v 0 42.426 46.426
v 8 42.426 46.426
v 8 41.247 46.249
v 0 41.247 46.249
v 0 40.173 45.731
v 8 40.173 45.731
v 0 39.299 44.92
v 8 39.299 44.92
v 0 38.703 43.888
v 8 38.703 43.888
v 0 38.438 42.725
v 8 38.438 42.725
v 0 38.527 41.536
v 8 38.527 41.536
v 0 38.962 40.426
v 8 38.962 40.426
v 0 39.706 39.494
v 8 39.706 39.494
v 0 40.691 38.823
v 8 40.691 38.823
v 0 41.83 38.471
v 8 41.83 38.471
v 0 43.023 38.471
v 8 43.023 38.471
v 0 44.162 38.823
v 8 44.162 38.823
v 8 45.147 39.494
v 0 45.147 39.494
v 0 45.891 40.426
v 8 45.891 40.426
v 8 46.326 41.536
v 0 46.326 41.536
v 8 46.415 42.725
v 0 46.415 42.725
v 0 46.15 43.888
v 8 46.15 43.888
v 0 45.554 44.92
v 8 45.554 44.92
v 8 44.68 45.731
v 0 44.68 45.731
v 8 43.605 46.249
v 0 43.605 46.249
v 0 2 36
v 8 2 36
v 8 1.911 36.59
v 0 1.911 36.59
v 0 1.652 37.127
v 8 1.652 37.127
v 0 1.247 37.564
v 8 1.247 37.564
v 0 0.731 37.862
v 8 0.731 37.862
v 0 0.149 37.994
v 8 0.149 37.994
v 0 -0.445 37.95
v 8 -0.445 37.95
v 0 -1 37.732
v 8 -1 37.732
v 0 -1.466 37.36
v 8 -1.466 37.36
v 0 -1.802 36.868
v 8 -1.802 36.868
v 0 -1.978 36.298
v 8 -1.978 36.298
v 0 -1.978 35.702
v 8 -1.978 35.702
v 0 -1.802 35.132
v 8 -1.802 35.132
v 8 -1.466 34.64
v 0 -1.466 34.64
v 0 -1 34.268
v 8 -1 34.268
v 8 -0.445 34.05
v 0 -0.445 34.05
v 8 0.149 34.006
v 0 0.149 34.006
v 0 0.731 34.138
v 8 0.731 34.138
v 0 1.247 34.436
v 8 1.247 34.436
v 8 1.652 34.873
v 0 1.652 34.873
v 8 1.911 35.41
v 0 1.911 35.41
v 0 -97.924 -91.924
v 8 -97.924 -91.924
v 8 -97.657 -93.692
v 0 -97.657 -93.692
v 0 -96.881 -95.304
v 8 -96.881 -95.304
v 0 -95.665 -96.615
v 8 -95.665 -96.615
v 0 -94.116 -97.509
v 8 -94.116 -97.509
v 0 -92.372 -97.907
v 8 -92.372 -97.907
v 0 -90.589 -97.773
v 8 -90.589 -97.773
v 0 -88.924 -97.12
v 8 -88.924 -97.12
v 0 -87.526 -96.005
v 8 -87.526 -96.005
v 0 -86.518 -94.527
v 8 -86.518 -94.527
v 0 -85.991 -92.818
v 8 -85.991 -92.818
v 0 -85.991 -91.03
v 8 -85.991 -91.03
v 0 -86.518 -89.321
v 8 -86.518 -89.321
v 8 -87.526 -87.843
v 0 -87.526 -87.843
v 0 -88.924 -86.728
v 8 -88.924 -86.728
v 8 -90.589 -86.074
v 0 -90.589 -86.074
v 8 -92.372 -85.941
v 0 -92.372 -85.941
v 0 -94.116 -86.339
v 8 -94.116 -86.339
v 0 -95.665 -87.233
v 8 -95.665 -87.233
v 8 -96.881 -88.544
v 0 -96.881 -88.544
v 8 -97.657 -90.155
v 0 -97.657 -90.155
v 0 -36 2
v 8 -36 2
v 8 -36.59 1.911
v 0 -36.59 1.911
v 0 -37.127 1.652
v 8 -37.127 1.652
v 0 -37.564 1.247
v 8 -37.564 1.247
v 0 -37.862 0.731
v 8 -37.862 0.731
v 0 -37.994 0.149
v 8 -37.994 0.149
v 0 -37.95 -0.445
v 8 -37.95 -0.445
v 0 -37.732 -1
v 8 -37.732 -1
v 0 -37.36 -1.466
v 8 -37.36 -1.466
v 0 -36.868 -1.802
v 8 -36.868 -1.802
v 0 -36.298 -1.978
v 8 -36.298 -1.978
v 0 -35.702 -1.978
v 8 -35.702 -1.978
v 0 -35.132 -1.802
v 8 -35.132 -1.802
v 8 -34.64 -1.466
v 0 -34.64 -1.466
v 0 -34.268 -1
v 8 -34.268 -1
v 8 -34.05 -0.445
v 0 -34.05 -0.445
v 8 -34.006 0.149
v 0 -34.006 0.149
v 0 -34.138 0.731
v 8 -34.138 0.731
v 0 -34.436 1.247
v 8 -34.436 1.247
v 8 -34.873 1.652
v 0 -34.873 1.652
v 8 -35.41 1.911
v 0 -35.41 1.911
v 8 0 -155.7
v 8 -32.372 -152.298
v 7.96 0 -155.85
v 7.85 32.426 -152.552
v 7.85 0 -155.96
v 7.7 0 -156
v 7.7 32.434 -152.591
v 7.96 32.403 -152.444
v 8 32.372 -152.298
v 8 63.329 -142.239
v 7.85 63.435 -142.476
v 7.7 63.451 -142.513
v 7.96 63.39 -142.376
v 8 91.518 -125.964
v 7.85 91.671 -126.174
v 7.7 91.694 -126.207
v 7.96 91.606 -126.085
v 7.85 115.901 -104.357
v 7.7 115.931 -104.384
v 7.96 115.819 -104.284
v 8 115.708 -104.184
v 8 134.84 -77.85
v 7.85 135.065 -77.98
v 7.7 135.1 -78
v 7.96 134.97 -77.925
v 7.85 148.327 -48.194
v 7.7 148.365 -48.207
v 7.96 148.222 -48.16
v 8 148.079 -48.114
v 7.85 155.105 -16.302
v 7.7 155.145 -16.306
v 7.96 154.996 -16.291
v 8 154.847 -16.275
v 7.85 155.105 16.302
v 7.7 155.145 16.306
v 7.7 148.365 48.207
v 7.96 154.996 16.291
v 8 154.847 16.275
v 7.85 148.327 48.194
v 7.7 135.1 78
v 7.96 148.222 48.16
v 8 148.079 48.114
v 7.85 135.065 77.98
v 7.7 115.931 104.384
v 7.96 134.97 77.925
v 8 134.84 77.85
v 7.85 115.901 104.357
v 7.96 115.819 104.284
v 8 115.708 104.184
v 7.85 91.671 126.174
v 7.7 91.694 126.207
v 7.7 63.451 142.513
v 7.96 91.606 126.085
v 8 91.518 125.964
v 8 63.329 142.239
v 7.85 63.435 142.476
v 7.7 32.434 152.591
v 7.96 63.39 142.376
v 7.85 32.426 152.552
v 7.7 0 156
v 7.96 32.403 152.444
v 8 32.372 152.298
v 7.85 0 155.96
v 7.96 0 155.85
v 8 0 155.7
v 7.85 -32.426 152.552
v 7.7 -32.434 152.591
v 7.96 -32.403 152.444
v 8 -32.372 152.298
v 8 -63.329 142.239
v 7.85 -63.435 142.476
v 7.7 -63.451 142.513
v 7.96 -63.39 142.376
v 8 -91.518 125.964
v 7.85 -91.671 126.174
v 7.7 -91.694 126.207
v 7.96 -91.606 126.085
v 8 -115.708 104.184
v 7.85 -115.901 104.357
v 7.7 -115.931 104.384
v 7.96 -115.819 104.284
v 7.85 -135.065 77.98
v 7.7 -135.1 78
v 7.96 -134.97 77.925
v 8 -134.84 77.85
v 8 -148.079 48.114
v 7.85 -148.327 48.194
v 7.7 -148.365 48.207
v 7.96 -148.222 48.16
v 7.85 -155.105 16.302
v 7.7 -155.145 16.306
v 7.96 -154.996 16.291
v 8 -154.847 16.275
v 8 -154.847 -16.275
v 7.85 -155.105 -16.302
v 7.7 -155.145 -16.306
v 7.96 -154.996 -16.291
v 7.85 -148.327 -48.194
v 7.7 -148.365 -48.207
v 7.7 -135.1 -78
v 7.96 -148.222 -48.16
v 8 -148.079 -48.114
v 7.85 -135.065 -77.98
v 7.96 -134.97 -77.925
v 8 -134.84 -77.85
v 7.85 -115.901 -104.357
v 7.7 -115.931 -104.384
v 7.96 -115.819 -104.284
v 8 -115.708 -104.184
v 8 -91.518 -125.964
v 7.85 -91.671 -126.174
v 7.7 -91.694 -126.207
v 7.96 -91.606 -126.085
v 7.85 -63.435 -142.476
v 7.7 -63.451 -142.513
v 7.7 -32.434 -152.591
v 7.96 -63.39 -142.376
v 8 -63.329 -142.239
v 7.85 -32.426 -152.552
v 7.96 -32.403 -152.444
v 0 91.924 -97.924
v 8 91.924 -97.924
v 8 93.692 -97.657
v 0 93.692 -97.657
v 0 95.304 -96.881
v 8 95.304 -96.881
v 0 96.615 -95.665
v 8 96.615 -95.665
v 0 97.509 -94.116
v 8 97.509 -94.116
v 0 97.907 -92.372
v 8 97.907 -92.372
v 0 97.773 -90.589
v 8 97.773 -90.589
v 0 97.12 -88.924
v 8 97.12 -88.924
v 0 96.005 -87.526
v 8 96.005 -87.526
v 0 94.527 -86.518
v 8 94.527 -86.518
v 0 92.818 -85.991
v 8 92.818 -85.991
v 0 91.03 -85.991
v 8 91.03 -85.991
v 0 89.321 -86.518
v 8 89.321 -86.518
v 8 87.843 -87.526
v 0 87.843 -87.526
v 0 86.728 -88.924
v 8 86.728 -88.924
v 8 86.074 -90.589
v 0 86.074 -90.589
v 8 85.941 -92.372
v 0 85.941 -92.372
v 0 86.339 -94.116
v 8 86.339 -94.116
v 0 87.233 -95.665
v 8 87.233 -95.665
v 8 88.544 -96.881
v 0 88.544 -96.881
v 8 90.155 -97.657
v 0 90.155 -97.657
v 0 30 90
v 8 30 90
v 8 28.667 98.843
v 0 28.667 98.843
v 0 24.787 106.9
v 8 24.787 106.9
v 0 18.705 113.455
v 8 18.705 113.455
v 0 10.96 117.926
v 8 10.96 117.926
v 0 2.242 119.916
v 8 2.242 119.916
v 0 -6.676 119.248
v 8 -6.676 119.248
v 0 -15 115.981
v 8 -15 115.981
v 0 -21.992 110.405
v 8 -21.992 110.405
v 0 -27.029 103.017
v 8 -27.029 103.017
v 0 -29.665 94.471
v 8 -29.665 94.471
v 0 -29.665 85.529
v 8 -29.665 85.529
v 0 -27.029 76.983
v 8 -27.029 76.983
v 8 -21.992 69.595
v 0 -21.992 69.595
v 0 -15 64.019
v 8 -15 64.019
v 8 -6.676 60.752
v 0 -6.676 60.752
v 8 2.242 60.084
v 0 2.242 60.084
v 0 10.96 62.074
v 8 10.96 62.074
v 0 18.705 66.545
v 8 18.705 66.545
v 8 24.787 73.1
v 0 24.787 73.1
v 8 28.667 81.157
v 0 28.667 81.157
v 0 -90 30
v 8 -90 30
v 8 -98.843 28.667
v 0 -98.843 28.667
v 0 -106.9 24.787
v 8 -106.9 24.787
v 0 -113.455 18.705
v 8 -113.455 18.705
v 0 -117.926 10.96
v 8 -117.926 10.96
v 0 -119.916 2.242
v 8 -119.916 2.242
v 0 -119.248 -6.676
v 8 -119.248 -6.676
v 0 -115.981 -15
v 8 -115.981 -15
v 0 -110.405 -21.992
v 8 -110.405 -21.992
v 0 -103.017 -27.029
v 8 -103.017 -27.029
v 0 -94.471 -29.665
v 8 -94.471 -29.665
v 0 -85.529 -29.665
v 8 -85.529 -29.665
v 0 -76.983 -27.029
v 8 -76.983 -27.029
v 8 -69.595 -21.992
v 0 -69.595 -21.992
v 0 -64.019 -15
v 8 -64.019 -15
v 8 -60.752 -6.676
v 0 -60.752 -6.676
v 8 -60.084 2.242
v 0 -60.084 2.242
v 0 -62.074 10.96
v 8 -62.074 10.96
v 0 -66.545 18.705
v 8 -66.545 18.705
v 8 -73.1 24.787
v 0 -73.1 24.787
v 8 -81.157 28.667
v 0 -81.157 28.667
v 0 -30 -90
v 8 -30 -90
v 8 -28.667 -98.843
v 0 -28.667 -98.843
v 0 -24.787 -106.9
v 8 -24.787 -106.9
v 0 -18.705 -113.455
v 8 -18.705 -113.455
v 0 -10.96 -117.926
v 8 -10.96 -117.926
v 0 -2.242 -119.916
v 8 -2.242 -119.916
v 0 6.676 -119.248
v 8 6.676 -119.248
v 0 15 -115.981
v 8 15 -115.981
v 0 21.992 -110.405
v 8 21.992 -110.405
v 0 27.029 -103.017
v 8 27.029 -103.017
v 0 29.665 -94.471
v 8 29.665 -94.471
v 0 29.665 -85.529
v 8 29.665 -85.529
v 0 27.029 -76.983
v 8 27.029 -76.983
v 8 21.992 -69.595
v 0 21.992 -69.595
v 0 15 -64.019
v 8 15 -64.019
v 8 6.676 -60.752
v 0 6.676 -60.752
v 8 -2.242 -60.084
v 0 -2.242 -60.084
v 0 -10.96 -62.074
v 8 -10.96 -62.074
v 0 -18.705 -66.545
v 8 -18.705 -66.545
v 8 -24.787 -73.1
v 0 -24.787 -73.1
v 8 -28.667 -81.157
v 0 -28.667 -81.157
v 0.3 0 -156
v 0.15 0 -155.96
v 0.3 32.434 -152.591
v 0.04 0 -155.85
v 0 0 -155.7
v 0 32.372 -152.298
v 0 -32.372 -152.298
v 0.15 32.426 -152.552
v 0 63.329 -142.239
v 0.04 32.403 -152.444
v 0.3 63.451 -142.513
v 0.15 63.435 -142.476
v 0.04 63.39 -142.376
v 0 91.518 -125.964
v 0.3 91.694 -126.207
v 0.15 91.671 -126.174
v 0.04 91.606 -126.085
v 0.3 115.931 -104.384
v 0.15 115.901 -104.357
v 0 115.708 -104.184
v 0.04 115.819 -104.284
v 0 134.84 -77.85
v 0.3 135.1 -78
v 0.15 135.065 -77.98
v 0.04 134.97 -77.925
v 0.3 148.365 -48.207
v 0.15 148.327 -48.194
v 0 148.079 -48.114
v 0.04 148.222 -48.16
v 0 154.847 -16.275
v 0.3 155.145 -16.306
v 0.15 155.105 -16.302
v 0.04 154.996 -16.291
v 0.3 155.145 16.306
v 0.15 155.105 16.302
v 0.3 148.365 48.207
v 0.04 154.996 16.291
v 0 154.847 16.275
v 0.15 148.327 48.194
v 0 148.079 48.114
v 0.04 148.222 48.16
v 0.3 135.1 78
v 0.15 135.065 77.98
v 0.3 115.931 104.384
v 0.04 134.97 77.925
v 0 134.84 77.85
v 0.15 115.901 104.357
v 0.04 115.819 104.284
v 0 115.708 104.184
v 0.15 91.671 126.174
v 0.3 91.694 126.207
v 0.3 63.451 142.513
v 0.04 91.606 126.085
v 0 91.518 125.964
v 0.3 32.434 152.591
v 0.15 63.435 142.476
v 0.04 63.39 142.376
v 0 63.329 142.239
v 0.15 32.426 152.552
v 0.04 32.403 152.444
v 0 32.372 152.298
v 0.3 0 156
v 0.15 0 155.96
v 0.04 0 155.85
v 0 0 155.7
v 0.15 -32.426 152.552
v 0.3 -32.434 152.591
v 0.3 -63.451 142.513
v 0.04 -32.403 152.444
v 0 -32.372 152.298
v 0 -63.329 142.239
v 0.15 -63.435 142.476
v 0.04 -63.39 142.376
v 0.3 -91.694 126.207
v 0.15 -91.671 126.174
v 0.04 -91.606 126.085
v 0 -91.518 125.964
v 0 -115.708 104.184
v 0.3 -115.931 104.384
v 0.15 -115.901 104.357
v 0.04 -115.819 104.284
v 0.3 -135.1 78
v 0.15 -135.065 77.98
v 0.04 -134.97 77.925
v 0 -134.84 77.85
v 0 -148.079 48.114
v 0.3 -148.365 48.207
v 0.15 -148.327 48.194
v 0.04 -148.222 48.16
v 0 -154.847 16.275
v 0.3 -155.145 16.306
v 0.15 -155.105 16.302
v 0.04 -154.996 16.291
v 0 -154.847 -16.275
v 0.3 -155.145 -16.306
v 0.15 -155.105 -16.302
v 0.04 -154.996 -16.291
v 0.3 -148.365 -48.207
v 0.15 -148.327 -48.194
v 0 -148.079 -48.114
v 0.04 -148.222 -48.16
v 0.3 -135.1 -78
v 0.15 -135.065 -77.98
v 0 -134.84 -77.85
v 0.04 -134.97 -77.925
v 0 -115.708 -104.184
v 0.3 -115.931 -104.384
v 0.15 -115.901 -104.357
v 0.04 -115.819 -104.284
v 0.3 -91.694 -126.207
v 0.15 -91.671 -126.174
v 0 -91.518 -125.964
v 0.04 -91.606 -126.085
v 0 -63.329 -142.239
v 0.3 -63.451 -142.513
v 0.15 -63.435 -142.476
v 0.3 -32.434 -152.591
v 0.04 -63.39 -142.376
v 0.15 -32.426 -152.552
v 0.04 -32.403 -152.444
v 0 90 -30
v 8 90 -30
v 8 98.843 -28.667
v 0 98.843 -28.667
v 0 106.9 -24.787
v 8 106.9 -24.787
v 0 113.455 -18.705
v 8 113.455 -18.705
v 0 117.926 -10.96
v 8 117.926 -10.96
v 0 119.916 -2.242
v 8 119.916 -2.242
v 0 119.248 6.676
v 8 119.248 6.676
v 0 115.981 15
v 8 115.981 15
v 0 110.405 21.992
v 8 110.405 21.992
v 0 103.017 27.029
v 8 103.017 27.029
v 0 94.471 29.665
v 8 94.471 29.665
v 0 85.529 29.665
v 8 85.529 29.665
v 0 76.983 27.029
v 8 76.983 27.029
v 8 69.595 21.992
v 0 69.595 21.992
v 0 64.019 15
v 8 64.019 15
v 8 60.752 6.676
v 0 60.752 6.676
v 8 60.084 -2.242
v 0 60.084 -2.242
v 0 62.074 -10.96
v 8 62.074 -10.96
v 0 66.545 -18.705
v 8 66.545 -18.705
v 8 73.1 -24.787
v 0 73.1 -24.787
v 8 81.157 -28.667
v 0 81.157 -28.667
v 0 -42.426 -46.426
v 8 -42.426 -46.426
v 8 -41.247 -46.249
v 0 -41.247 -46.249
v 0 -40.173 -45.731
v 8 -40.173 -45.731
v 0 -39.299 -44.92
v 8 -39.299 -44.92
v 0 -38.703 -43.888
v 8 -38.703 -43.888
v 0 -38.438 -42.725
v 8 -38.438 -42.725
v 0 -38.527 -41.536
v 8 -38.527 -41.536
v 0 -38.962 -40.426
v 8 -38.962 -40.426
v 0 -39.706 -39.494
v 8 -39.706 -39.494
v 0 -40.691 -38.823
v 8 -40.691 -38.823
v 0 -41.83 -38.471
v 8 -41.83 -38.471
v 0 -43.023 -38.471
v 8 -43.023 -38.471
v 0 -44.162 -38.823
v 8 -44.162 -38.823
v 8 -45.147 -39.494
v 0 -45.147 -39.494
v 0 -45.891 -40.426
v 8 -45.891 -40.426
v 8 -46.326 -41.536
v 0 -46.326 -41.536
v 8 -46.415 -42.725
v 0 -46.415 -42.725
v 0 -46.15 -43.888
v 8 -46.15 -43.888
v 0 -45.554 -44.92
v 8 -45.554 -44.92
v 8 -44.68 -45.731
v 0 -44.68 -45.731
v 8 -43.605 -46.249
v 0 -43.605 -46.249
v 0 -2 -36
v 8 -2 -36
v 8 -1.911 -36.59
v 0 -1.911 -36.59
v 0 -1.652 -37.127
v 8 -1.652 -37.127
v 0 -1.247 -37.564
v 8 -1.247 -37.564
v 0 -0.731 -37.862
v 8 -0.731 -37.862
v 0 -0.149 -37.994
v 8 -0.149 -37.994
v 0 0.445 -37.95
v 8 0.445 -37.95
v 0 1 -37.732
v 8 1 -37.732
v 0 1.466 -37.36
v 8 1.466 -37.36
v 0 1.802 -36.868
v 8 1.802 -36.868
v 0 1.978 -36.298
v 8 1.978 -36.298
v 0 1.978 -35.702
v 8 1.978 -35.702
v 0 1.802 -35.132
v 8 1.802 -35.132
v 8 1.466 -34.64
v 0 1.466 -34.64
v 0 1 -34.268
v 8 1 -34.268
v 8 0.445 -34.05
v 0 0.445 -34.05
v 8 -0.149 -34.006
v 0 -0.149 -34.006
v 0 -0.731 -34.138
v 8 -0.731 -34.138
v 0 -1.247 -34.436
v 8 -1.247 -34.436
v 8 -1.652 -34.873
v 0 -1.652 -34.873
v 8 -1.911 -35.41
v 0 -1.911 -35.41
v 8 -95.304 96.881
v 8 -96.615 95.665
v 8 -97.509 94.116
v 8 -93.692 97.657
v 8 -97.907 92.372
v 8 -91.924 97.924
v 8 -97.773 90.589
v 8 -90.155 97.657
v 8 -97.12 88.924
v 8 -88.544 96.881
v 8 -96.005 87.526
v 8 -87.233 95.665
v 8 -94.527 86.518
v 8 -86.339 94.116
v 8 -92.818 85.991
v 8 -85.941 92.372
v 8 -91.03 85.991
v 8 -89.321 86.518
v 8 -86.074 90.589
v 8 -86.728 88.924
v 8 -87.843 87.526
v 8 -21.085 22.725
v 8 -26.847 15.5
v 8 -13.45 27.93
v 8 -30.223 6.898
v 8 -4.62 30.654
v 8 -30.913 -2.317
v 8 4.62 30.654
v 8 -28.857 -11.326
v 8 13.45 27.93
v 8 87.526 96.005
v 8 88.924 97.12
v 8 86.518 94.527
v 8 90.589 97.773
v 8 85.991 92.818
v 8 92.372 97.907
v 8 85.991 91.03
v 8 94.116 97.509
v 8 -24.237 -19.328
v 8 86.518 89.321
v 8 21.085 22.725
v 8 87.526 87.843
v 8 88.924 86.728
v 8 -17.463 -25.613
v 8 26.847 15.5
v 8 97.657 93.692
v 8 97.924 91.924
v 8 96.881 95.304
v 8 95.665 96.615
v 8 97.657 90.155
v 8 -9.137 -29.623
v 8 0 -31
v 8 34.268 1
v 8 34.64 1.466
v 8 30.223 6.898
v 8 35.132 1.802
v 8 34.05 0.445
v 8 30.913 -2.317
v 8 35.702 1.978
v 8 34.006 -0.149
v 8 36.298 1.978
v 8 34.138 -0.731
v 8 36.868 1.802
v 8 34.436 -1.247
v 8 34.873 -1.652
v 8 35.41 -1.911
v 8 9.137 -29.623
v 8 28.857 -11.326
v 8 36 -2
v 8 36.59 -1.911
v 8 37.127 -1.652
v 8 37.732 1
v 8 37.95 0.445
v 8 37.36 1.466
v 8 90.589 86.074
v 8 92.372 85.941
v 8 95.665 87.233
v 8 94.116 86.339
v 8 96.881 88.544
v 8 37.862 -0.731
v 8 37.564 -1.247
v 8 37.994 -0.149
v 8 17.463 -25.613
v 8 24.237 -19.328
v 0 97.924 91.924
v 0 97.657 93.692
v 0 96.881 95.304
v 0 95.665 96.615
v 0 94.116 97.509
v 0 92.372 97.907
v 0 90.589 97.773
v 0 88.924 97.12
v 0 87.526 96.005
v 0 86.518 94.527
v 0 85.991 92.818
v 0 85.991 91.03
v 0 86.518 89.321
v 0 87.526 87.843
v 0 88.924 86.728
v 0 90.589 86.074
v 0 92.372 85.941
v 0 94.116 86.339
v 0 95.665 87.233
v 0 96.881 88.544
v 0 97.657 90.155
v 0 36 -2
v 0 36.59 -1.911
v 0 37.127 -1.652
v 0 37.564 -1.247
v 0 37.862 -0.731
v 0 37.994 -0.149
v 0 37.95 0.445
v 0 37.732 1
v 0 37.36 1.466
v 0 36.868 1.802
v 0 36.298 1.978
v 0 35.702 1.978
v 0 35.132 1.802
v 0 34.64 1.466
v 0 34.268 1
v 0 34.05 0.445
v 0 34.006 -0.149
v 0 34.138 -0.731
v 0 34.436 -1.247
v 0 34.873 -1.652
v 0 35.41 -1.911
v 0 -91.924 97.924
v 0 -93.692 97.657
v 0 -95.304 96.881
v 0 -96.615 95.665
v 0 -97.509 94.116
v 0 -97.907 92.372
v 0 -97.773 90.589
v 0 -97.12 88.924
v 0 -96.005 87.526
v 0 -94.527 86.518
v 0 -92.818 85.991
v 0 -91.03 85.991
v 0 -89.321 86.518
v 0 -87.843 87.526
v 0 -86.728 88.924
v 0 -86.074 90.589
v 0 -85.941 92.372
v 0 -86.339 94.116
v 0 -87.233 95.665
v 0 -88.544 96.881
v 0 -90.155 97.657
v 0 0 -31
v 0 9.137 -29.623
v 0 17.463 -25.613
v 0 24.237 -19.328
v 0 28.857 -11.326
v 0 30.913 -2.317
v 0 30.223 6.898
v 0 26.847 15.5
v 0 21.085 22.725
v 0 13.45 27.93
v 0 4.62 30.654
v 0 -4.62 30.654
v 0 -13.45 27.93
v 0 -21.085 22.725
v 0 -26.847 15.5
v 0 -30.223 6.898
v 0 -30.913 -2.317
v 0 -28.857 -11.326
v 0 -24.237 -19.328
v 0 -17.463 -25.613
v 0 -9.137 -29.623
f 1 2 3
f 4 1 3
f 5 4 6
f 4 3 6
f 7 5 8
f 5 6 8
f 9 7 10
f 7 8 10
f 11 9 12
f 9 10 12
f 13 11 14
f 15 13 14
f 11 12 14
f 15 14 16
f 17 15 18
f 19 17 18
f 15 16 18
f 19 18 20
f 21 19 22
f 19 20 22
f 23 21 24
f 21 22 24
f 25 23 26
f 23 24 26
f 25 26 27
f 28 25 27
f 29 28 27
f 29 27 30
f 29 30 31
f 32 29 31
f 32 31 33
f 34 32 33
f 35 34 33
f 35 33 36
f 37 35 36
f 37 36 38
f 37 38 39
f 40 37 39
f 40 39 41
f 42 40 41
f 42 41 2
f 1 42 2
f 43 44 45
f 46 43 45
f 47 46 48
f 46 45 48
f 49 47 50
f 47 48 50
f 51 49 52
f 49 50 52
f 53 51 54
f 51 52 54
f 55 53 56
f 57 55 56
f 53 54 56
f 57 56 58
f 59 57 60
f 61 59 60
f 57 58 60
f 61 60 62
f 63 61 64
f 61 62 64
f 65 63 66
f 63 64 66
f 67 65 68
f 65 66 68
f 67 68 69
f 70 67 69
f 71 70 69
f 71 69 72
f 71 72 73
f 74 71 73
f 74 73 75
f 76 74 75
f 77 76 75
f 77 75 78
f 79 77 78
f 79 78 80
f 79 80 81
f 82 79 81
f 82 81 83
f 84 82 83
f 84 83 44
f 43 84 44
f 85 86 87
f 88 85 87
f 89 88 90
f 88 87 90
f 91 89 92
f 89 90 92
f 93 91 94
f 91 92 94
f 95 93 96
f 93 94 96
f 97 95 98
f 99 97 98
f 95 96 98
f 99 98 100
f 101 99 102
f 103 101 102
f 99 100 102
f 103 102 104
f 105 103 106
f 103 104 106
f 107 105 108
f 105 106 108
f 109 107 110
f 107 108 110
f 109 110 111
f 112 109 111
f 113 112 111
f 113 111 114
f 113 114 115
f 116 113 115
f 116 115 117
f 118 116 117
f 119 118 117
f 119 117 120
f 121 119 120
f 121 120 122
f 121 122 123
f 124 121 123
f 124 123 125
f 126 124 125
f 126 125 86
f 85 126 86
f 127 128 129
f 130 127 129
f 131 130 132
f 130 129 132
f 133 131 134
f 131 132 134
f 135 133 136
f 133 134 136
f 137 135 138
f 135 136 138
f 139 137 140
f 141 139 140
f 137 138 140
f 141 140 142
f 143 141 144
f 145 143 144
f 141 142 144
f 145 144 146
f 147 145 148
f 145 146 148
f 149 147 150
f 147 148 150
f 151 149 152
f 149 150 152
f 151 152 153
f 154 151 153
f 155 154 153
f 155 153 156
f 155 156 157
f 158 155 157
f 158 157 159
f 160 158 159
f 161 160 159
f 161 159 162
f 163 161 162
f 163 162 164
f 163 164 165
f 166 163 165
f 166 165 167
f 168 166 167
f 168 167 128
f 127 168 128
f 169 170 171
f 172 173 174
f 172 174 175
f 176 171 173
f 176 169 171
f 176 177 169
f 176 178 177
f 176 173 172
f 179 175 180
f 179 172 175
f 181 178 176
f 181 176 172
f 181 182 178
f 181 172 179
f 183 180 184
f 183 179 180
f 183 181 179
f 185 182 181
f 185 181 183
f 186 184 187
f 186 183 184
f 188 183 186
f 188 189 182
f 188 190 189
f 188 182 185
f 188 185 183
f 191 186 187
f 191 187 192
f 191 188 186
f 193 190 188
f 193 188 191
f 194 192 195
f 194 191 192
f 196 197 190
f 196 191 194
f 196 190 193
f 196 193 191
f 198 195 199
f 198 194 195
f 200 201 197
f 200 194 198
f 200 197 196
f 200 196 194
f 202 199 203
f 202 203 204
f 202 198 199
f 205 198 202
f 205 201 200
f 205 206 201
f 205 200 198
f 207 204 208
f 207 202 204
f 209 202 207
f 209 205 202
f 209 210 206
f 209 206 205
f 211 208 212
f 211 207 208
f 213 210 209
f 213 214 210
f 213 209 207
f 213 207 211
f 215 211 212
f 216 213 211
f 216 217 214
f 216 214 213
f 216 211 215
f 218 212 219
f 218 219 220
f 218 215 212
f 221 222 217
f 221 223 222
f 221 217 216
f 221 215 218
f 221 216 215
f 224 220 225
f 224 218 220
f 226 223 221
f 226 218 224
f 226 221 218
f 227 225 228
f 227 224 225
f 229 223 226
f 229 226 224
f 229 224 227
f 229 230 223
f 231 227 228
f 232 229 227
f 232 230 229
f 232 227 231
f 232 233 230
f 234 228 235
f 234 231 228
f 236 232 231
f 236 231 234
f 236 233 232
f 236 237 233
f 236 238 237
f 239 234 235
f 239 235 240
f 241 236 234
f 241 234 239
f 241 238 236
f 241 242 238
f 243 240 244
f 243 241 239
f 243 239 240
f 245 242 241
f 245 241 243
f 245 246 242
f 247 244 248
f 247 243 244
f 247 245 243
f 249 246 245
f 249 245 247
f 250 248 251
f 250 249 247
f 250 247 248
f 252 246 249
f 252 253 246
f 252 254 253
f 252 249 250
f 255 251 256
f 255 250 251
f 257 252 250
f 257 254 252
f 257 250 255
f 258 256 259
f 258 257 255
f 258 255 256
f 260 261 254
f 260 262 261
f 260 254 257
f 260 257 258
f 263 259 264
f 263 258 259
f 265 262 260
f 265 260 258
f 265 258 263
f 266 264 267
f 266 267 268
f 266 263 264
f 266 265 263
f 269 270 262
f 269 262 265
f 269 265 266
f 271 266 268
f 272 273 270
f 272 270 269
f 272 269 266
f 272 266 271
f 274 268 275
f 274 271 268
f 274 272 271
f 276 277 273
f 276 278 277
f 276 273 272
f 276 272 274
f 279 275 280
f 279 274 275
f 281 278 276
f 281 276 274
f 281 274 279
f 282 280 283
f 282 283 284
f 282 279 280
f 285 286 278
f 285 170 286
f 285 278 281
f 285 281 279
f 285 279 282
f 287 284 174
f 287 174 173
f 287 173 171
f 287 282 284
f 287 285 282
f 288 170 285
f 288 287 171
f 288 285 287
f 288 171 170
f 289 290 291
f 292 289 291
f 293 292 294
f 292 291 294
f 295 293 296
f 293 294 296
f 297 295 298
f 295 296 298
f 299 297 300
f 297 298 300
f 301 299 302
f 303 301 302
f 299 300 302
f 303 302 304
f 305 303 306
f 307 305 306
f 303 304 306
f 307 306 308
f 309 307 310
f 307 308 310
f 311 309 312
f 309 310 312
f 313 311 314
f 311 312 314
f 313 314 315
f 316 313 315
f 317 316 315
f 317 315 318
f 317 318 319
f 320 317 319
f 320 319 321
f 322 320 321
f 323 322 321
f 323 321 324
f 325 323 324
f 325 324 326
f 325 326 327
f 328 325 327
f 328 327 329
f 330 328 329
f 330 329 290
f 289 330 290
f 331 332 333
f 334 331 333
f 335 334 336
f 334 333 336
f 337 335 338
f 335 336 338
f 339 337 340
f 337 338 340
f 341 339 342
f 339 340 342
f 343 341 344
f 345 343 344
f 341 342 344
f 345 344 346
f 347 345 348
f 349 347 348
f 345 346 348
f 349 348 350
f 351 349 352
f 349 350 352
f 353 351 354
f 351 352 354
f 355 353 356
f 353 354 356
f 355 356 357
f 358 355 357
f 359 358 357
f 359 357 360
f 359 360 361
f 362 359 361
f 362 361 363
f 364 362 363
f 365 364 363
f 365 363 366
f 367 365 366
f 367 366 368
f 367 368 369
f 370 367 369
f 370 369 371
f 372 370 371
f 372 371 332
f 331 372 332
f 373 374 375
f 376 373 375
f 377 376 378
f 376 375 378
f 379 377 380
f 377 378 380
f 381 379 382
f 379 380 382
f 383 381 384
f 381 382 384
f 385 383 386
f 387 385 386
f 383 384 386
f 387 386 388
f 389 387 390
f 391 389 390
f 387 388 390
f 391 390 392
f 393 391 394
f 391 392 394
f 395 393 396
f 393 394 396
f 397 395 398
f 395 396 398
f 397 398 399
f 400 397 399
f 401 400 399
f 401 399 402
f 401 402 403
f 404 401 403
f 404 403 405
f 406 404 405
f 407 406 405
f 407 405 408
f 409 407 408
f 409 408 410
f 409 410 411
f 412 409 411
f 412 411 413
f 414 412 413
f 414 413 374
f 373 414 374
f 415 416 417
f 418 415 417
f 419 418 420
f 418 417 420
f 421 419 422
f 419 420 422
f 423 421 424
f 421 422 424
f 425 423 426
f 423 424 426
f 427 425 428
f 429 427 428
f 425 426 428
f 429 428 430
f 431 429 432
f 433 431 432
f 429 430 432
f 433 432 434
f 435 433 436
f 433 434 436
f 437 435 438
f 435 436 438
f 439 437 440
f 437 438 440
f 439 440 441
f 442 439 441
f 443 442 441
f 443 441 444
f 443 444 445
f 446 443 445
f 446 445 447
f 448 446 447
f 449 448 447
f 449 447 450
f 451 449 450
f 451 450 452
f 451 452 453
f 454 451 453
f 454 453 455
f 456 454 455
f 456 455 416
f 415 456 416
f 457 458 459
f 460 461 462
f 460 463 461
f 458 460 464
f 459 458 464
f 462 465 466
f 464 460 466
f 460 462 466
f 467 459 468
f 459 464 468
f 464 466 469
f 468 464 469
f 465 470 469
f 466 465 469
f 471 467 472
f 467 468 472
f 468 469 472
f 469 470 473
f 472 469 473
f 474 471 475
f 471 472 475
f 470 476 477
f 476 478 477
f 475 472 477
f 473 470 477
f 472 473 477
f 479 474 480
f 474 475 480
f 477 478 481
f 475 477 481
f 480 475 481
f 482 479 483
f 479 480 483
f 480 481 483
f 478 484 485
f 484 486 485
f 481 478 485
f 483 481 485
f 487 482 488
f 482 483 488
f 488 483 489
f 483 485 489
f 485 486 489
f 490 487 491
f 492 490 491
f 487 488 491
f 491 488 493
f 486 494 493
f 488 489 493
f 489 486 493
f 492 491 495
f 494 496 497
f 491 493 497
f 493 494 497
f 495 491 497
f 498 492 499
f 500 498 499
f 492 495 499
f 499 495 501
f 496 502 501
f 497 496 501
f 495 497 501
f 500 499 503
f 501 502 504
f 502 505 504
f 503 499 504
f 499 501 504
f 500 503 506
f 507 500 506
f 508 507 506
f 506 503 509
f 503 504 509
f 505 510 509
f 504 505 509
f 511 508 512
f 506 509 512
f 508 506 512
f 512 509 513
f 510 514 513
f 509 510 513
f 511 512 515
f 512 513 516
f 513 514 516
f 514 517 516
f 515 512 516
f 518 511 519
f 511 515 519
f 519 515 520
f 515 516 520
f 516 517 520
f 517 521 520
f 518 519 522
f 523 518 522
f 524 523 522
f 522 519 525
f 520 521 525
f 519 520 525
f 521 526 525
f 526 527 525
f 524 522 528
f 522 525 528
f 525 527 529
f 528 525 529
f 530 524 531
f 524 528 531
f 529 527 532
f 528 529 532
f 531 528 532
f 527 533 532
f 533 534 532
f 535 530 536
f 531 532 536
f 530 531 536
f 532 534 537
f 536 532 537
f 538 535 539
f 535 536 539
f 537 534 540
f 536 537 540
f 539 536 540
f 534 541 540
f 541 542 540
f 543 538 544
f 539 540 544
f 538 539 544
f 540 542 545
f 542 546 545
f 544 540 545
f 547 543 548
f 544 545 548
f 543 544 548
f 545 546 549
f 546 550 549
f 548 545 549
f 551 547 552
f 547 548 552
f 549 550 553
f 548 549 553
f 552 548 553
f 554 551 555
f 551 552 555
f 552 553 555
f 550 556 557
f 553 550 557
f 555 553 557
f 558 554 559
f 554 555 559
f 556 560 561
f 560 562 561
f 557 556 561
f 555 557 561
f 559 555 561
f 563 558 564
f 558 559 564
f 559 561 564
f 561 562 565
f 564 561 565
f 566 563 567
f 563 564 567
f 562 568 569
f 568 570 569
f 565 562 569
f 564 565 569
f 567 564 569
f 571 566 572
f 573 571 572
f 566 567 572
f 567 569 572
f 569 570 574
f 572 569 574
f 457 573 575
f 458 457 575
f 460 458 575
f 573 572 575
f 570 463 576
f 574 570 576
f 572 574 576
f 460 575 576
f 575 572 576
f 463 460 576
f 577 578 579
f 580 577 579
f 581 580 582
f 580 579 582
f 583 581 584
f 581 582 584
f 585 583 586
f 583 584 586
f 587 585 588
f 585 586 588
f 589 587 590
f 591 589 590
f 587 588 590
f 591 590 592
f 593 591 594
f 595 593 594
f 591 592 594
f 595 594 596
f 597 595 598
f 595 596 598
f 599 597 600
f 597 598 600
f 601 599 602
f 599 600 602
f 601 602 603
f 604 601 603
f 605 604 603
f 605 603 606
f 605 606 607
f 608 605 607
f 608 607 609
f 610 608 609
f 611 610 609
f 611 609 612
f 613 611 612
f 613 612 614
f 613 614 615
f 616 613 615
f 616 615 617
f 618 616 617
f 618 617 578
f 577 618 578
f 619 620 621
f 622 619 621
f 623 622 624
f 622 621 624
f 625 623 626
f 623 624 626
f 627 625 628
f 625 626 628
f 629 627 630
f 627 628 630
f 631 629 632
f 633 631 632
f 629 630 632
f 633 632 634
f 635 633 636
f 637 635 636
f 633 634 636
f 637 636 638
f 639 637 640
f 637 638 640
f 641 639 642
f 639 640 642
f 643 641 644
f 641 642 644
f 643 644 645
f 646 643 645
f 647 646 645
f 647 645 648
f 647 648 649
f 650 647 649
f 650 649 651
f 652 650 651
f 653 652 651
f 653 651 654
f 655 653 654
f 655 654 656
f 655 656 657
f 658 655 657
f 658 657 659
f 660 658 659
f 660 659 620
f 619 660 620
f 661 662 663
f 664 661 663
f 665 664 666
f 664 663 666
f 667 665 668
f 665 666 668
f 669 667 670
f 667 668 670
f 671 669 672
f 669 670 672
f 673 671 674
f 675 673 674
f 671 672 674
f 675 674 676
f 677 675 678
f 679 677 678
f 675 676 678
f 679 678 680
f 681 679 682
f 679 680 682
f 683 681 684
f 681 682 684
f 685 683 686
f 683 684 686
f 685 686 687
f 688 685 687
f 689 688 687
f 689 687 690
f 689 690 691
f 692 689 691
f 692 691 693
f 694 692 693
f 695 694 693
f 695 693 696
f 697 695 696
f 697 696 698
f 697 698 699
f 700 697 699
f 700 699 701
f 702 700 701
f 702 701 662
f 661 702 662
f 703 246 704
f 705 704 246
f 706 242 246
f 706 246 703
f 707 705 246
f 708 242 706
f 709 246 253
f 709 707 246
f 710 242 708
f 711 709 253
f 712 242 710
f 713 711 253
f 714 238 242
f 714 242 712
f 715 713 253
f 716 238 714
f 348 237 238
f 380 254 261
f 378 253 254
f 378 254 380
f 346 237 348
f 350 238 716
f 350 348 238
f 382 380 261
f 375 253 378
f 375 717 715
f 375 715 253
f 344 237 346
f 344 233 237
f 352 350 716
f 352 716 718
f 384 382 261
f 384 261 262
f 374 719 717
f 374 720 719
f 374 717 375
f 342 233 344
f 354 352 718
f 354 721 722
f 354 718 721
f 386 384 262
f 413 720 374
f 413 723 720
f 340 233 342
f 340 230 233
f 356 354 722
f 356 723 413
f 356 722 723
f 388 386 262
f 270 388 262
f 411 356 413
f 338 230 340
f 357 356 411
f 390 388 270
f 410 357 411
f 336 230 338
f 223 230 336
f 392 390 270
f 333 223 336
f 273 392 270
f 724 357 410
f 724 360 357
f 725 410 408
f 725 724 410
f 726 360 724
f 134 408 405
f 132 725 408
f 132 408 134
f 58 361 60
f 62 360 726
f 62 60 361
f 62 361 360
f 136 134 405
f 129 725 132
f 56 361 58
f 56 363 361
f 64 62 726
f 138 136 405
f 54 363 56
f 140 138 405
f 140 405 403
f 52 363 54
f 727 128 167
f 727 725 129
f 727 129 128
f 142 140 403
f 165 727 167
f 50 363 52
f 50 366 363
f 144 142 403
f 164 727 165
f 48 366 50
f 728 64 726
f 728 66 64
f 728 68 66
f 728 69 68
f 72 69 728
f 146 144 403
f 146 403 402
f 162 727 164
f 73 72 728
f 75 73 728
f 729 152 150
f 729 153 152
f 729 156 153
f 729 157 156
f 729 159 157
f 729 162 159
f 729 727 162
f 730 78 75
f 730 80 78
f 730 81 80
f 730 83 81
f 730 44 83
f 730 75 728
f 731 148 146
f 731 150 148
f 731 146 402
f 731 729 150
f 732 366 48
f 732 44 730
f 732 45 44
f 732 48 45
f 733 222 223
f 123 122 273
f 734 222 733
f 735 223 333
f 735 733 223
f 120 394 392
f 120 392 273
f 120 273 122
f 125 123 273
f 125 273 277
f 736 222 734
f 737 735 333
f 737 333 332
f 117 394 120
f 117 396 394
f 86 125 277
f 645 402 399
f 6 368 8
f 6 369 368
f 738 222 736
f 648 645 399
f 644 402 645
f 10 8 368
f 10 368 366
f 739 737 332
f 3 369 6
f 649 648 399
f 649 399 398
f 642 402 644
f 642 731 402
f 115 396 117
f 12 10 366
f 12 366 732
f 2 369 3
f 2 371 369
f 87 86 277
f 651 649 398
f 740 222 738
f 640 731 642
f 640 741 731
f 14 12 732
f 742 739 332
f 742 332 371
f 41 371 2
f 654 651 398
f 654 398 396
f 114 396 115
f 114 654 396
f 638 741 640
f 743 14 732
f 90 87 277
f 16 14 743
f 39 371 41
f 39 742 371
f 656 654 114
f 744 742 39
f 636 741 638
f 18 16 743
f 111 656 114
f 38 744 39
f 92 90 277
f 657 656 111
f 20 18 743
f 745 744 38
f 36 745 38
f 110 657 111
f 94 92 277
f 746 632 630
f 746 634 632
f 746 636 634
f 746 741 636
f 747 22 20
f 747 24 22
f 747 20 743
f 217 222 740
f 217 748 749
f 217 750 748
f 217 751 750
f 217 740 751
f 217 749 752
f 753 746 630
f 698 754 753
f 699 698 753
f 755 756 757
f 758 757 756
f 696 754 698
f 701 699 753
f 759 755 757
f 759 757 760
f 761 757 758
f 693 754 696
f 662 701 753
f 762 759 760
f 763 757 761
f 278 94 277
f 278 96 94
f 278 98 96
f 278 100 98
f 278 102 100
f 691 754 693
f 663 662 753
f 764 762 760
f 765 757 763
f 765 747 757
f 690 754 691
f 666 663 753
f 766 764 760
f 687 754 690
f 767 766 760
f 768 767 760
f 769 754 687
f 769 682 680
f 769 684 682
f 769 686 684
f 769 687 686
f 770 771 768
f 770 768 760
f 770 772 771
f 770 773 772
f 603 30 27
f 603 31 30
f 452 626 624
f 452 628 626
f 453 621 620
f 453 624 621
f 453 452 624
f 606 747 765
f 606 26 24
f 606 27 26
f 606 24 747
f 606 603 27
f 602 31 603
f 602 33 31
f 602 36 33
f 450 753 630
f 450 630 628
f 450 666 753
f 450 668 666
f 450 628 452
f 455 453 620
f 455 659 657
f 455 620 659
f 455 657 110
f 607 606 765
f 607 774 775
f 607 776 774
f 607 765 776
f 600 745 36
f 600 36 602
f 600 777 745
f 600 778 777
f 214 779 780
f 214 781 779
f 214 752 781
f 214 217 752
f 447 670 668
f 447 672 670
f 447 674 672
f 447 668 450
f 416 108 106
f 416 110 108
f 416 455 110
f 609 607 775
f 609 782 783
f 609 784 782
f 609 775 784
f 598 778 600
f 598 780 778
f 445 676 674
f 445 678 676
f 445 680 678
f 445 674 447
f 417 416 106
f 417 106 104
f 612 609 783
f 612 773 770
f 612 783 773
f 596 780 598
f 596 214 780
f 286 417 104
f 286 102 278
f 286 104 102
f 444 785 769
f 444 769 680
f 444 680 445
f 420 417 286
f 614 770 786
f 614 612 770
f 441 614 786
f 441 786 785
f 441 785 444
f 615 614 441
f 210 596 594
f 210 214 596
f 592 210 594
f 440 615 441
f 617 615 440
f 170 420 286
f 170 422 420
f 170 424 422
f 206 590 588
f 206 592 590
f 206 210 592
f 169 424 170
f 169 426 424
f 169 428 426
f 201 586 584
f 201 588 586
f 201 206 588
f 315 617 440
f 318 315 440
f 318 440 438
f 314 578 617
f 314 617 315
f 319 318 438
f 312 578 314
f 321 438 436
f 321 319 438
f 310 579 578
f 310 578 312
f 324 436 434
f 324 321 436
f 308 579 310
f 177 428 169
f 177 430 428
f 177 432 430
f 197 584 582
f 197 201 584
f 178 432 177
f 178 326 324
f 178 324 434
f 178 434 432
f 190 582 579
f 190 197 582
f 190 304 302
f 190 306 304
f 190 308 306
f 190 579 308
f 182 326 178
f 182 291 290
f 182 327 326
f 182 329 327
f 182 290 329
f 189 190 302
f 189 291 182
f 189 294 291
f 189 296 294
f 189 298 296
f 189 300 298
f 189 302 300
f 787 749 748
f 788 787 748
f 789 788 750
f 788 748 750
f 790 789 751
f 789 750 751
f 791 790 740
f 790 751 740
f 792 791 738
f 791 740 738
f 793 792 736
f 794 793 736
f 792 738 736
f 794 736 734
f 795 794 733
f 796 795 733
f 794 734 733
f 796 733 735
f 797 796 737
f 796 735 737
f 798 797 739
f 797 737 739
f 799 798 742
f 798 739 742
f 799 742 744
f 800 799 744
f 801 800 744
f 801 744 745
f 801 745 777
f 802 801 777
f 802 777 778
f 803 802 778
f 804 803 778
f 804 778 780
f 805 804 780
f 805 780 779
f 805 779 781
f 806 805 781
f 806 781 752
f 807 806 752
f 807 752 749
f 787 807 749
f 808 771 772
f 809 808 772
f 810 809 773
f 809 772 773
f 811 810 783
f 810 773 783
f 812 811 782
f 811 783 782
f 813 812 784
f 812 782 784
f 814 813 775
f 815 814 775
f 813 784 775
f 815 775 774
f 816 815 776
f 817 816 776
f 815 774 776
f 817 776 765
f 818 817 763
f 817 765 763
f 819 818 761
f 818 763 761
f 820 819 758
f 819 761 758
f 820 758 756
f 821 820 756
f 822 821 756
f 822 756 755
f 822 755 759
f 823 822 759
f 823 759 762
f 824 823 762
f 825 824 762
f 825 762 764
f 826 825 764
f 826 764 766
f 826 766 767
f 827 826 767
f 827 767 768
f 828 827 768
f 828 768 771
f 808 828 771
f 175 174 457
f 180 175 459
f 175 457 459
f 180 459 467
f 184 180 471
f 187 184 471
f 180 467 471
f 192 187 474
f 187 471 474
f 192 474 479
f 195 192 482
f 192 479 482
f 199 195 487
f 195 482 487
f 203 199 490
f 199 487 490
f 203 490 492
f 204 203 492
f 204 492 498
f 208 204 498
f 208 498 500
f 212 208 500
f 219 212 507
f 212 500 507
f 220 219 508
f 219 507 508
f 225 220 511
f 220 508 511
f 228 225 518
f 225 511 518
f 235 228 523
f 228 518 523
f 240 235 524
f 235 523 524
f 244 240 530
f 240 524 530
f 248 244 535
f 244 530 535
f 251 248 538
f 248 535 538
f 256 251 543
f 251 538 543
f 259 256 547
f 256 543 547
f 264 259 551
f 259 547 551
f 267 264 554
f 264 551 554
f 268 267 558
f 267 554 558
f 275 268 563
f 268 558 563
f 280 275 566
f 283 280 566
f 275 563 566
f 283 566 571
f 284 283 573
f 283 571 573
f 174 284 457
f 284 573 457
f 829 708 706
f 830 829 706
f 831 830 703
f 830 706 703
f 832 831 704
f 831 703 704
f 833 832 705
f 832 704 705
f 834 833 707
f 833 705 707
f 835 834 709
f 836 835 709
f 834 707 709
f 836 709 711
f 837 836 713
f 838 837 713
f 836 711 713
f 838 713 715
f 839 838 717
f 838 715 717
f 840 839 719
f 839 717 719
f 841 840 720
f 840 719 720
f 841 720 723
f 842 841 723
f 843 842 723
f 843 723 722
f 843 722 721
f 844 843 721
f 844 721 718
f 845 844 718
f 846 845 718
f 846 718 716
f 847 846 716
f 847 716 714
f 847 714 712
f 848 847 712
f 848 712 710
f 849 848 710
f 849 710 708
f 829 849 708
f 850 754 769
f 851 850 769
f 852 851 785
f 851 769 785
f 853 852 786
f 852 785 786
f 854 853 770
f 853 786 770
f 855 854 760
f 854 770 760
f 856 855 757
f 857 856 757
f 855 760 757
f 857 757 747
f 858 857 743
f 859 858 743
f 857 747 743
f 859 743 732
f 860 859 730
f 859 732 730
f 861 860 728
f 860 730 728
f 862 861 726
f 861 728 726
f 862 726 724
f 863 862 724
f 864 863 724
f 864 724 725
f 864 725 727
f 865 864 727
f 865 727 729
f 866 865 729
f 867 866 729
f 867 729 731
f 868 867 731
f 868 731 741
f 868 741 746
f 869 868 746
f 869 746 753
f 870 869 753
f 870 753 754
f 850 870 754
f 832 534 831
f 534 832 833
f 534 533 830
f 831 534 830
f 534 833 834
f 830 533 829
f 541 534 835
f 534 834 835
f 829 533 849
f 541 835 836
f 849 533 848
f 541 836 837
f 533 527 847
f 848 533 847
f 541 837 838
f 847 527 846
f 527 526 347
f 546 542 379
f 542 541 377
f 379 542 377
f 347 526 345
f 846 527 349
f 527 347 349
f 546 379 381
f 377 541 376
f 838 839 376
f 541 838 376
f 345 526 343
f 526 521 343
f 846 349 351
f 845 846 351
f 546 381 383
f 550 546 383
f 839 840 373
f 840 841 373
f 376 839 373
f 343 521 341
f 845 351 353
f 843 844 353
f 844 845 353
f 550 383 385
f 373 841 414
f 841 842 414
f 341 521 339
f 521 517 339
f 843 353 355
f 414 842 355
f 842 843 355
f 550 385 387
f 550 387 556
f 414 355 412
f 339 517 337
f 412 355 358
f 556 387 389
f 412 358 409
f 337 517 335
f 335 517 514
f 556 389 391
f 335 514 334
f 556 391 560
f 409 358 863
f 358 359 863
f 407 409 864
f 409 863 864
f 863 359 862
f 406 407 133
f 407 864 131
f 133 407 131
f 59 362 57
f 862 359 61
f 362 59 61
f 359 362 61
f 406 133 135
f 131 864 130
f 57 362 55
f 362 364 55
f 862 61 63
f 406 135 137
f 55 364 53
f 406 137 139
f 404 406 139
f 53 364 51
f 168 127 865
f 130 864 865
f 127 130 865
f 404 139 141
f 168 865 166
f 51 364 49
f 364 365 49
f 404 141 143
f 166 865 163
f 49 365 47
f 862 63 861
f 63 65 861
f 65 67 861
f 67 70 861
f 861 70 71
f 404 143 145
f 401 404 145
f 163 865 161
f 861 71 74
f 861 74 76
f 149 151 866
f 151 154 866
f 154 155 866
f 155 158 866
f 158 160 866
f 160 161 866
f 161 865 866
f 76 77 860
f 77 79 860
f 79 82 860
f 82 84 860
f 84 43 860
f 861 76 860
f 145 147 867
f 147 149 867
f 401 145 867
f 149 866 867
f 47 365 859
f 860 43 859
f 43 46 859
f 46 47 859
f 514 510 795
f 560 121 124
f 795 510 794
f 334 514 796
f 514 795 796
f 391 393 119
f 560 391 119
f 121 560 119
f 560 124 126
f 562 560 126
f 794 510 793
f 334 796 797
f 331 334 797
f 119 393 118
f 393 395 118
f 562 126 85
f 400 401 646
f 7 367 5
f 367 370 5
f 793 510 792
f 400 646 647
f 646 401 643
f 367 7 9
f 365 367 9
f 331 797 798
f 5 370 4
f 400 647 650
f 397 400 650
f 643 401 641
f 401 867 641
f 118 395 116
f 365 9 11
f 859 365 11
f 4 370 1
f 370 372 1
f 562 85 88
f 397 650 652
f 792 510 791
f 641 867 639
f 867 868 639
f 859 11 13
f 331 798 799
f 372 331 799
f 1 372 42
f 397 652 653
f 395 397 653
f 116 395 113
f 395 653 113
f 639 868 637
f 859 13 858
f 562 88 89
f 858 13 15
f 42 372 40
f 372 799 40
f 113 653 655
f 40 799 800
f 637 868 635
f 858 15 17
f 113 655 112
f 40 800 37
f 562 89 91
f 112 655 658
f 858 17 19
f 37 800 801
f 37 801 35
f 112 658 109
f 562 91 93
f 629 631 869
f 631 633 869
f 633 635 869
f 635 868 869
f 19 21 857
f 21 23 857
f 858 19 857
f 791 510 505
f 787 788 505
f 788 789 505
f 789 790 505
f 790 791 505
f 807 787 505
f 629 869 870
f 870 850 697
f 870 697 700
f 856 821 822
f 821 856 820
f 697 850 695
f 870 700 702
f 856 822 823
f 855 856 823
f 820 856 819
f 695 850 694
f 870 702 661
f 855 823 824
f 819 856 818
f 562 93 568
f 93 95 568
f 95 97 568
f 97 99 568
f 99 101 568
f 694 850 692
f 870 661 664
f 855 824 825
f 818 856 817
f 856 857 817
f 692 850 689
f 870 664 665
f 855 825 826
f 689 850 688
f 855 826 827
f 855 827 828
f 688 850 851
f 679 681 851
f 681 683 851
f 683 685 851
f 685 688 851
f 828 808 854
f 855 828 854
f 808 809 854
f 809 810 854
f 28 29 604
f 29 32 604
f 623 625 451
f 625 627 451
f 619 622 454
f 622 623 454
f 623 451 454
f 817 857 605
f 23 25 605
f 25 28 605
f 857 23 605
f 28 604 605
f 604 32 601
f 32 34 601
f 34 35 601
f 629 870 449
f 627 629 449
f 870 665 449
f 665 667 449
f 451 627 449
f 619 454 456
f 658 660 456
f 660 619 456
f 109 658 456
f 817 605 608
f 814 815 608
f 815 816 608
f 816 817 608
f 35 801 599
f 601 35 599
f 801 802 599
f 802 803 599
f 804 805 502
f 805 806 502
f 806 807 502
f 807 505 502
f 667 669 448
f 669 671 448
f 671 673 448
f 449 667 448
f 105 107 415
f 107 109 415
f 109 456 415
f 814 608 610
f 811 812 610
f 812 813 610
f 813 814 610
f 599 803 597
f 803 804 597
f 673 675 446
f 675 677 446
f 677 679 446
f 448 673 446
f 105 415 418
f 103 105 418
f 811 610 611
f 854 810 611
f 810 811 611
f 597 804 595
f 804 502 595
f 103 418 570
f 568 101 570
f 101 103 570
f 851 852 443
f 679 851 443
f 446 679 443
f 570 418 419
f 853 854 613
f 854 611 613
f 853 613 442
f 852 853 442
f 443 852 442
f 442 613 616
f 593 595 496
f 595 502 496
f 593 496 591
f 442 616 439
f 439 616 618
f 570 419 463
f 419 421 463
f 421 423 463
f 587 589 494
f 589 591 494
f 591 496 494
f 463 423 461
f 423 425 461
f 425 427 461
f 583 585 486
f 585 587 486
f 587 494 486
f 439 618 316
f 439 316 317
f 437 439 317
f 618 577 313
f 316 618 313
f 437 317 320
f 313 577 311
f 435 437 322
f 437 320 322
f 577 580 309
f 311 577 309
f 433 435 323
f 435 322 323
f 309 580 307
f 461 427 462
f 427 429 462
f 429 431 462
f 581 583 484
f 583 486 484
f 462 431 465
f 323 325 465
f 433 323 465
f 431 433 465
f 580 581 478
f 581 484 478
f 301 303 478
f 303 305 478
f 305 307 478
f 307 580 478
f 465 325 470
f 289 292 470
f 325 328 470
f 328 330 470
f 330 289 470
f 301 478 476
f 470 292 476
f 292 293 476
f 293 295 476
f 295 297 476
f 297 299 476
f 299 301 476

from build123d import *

# Parameters (mm, degrees)
SKETCH_1_R               = 156
EXTRUDE_1_DEPTH          = 8
SKETCH_2_R               = 31
CUT_EXTRUDE_1_DEPTH      = 10
SKETCH_4_R               = 6
CUT_EXTRUDE_3_DEPTH      = 10
PATTERN_CIRCULAR_2_COUNT = 4
SKETCH_6_R               = 2
CUT_EXTRUDE_5_DEPTH      = 10
PATTERN_CIRCULAR_4_COUNT = 4
FILLET_1_R               = 0.3
SKETCH_8_R               = 4
CUT_EXTRUDE_7_DEPTH      = 10
SKETCH_9_R               = 30
CUT_EXTRUDE_8_DEPTH      = 10
PATTERN_CIRCULAR_6_COUNT = 4
PATTERN_CIRCULAR_7_COUNT = 2


with BuildPart() as part:
    # 草图1 → 凸台-拉伸1 (new body)
    with BuildSketch(Plane(origin=(0, 0, 0), x_dir=(0, 0, -1), z_dir=(1, 0, 0))):
        Circle(SKETCH_1_R)
    extrude(amount=EXTRUDE_1_DEPTH)

    # 草图2 → 切除-拉伸1 (cut)
    with BuildSketch(Plane(origin=(8, 0, 0), x_dir=(0, 0, -1), z_dir=(1, 0, 0))):
        Circle(SKETCH_2_R)
    extrude(amount=-CUT_EXTRUDE_1_DEPTH, mode=Mode.SUBTRACT)

    # 草图4 → 切除-拉伸3 (cut)
    with BuildSketch(Plane(origin=(8, 0, 0), x_dir=(0, 0, -1), z_dir=(1, 0, 0))):
        with Locations((91.923881554, 91.923881554)):
            Circle(SKETCH_4_R)
    cut_extrude_3 = extrude(amount=-CUT_EXTRUDE_3_DEPTH, mode=Mode.SUBTRACT)

    # 阵列(圆周)2: 切除-拉伸3 ×4 about axis
    pattern_circular_2_axis = Axis((0, 0, 0), (1, 0, 0))
    for i in range(1, PATTERN_CIRCULAR_2_COUNT):
        add(cut_extrude_3.rotate(pattern_circular_2_axis, i * 360 / PATTERN_CIRCULAR_2_COUNT), mode=Mode.SUBTRACT)

    # 草图6 → 切除-拉伸5 (cut)
    with BuildSketch(Plane(origin=(8, 0, 0), x_dir=(0, 0, -1), z_dir=(1, 0, 0))):
        with Locations((0, 36)):
            Circle(SKETCH_6_R)
    cut_extrude_5 = extrude(amount=-CUT_EXTRUDE_5_DEPTH, mode=Mode.SUBTRACT)

    # 阵列(圆周)4: 切除-拉伸5 ×4 about axis
    pattern_circular_4_axis = Axis((0, 0, 0), (1, 0, 0))
    for i in range(1, PATTERN_CIRCULAR_4_COUNT):
        add(cut_extrude_5.rotate(pattern_circular_4_axis, i * 360 / PATTERN_CIRCULAR_4_COUNT), mode=Mode.SUBTRACT)

    # 圆角1
    fillet_1_edges = [part.edges().sort_by_distance(p)[0] for p in [
        (0, 0, 156),
        (8, 0, 156),
    ]]
    fillet(fillet_1_edges, radius=FILLET_1_R)

    # 草图8 → 切除-拉伸7 (cut)
    with BuildSketch(Plane(origin=(8, 0, 0), x_dir=(0, 0, -1), z_dir=(1, 0, 0))):
        with Locations((42.426406871, -42.426406871)):
            Circle(SKETCH_8_R)
    cut_extrude_7 = extrude(amount=-CUT_EXTRUDE_7_DEPTH, mode=Mode.SUBTRACT)

    # 草图9 → 切除-拉伸8 (cut)
    with BuildSketch(Plane(origin=(8, 0, 0), x_dir=(0, 0, -1), z_dir=(1, 0, 0))):
        with Locations((0, 90)):
            Circle(SKETCH_9_R)
    cut_extrude_8 = extrude(amount=-CUT_EXTRUDE_8_DEPTH, mode=Mode.SUBTRACT)

    # 阵列(圆周)6: 切除-拉伸8 ×4 about axis
    pattern_circular_6_axis = Axis((0, 0, 0), (1, 0, 0))
    for i in range(1, PATTERN_CIRCULAR_6_COUNT):
        add(cut_extrude_8.rotate(pattern_circular_6_axis, i * 360 / PATTERN_CIRCULAR_6_COUNT), mode=Mode.SUBTRACT)

    # 阵列(圆周)7: 切除-拉伸7 ×2 about axis
    pattern_circular_7_axis = Axis((0, 0, 0), (1, 0, 0))
    for i in range(1, PATTERN_CIRCULAR_7_COUNT):
        add(cut_extrude_7.rotate(pattern_circular_7_axis, i * 360 / PATTERN_CIRCULAR_7_COUNT), mode=Mode.SUBTRACT)


solid = part.part
